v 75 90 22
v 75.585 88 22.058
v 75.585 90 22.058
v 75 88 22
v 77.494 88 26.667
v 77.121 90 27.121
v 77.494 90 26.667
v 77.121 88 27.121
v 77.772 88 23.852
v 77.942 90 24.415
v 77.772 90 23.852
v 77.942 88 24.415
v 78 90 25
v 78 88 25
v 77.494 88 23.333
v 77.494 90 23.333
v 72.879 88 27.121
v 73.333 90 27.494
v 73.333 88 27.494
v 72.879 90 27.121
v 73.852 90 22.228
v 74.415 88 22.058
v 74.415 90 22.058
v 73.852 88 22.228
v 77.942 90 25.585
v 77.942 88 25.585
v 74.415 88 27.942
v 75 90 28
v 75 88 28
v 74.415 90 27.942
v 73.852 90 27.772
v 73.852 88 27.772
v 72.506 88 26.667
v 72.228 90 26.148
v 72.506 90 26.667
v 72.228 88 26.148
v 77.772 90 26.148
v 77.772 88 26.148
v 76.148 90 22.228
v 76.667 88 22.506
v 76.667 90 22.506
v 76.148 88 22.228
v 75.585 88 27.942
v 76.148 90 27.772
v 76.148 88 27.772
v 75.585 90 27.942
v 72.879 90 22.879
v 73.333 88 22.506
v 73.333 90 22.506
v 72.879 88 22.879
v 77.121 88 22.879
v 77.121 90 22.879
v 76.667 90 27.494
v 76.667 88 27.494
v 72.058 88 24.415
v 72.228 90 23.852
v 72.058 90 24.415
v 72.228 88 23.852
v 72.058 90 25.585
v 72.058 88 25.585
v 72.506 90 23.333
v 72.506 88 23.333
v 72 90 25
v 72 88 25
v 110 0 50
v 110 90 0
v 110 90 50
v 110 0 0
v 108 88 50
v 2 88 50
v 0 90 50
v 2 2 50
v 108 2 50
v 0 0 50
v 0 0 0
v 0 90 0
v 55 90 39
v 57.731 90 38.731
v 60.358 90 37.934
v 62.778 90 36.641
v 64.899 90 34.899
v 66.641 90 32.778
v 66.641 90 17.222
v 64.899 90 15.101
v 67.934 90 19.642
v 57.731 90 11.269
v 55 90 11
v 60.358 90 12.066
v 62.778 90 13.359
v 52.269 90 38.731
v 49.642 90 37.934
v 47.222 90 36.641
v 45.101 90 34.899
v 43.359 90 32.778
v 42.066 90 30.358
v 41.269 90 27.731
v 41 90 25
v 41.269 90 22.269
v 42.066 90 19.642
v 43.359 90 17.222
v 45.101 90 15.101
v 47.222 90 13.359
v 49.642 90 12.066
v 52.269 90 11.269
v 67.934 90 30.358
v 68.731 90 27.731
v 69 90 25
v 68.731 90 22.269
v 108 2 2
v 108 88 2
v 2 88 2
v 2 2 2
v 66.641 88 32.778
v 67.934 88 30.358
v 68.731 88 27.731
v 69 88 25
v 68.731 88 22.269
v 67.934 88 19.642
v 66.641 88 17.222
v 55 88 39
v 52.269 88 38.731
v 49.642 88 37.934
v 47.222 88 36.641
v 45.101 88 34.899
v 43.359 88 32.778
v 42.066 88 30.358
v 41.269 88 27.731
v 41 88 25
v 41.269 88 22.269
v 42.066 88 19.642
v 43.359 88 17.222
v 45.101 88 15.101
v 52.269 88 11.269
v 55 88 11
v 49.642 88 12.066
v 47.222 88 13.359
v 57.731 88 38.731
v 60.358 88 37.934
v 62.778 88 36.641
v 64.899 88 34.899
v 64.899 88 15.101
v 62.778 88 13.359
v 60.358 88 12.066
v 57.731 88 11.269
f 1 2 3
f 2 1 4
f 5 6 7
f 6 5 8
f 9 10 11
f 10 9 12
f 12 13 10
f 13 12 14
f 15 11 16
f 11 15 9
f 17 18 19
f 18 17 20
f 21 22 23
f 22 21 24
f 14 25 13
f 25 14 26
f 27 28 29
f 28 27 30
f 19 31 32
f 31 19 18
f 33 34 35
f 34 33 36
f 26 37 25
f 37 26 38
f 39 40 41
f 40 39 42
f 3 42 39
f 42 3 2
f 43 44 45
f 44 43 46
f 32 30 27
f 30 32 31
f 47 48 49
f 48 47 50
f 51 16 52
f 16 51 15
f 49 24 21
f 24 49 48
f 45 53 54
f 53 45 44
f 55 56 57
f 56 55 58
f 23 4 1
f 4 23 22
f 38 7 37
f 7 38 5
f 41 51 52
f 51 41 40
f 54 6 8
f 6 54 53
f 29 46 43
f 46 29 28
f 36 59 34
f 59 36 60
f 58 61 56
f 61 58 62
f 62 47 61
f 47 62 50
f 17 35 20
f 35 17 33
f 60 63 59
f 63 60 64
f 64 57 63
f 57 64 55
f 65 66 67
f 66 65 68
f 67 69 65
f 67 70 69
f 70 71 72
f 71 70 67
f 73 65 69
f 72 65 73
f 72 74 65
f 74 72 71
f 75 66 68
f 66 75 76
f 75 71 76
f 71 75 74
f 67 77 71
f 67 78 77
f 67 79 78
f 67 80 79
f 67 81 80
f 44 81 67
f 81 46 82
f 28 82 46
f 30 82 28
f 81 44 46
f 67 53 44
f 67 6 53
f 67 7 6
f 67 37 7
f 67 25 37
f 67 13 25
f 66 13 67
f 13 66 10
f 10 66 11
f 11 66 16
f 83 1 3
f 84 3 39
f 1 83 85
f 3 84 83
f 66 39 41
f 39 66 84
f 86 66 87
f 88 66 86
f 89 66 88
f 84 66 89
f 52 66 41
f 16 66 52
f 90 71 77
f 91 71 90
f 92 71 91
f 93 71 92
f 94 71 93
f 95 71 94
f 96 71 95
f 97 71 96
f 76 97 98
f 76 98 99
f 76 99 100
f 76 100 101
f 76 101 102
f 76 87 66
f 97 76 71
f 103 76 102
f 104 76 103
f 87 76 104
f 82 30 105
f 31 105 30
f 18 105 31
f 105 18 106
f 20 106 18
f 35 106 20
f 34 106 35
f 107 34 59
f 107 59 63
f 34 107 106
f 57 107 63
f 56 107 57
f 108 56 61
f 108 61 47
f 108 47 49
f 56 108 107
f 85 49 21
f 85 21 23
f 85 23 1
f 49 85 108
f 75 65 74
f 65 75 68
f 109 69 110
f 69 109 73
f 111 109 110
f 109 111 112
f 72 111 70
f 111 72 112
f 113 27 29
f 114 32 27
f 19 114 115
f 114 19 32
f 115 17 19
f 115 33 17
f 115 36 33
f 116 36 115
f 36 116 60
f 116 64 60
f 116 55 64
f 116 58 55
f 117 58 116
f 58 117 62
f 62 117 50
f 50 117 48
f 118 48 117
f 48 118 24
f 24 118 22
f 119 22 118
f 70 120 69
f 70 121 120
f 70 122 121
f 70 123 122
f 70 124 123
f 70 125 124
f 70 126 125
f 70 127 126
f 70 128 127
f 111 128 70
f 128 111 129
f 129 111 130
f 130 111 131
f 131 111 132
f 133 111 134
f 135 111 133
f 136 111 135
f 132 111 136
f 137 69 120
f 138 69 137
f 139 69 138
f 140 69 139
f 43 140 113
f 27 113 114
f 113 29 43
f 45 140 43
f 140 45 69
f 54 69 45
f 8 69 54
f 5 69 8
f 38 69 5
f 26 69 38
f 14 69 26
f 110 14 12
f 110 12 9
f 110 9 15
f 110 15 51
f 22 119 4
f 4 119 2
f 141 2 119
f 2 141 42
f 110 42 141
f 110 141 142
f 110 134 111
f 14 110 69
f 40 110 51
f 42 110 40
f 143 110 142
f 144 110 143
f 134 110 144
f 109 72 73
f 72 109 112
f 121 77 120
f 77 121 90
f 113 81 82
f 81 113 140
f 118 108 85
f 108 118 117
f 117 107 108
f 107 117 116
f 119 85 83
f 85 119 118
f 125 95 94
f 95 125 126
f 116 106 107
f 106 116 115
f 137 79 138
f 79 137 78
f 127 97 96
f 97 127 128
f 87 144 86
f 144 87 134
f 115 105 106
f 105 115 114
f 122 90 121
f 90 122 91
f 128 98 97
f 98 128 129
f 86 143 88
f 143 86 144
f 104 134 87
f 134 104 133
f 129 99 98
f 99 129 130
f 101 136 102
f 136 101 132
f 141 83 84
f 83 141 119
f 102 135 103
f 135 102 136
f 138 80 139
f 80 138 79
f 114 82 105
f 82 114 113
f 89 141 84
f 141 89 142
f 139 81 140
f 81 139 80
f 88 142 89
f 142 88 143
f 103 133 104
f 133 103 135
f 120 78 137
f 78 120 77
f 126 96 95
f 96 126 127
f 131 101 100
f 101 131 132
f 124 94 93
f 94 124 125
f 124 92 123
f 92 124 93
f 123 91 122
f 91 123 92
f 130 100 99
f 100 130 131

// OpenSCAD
$fn = 32;

// ----------------------------------------------------------------------
// Vent box: roundvent enclosure
// ----------------------------------------------------------------------

// --- parameters (mm) ---
box_l = 110;              // box length, X
box_w = 90;               // box width, Y
box_h = 50;               // box height, Z
wall_t = 2;               // shell wall thickness
vent_d = 28;              // central vent diameter
ring_d = 6;               // ring hole diameter
n_ring = 6;               // holes in the ring
ring_r = 20;              // ring radius

ring_step = 360 / n_ring;  // ring hole angular step

difference() {
  cube([box_l, box_w, box_h]);
  translate([wall_t, wall_t, wall_t])
    cube([box_l - 2 * wall_t, box_w - 2 * wall_t, box_h]);
  translate([box_l / 2, box_w - wall_t - 1, box_h / 2])
    rotate([-90, 0, 0]) cylinder(h = wall_t + 2, d = vent_d);
  for (i = [0 : n_ring - 1])
    translate([box_l / 2, box_w - wall_t - 1, box_h / 2])
      rotate([0, 0, i * ring_step])
        translate([ring_r, 0, 0]) rotate([-90, 0, 0])
          cylinder(h = wall_t + 2, d = ring_d);
}
